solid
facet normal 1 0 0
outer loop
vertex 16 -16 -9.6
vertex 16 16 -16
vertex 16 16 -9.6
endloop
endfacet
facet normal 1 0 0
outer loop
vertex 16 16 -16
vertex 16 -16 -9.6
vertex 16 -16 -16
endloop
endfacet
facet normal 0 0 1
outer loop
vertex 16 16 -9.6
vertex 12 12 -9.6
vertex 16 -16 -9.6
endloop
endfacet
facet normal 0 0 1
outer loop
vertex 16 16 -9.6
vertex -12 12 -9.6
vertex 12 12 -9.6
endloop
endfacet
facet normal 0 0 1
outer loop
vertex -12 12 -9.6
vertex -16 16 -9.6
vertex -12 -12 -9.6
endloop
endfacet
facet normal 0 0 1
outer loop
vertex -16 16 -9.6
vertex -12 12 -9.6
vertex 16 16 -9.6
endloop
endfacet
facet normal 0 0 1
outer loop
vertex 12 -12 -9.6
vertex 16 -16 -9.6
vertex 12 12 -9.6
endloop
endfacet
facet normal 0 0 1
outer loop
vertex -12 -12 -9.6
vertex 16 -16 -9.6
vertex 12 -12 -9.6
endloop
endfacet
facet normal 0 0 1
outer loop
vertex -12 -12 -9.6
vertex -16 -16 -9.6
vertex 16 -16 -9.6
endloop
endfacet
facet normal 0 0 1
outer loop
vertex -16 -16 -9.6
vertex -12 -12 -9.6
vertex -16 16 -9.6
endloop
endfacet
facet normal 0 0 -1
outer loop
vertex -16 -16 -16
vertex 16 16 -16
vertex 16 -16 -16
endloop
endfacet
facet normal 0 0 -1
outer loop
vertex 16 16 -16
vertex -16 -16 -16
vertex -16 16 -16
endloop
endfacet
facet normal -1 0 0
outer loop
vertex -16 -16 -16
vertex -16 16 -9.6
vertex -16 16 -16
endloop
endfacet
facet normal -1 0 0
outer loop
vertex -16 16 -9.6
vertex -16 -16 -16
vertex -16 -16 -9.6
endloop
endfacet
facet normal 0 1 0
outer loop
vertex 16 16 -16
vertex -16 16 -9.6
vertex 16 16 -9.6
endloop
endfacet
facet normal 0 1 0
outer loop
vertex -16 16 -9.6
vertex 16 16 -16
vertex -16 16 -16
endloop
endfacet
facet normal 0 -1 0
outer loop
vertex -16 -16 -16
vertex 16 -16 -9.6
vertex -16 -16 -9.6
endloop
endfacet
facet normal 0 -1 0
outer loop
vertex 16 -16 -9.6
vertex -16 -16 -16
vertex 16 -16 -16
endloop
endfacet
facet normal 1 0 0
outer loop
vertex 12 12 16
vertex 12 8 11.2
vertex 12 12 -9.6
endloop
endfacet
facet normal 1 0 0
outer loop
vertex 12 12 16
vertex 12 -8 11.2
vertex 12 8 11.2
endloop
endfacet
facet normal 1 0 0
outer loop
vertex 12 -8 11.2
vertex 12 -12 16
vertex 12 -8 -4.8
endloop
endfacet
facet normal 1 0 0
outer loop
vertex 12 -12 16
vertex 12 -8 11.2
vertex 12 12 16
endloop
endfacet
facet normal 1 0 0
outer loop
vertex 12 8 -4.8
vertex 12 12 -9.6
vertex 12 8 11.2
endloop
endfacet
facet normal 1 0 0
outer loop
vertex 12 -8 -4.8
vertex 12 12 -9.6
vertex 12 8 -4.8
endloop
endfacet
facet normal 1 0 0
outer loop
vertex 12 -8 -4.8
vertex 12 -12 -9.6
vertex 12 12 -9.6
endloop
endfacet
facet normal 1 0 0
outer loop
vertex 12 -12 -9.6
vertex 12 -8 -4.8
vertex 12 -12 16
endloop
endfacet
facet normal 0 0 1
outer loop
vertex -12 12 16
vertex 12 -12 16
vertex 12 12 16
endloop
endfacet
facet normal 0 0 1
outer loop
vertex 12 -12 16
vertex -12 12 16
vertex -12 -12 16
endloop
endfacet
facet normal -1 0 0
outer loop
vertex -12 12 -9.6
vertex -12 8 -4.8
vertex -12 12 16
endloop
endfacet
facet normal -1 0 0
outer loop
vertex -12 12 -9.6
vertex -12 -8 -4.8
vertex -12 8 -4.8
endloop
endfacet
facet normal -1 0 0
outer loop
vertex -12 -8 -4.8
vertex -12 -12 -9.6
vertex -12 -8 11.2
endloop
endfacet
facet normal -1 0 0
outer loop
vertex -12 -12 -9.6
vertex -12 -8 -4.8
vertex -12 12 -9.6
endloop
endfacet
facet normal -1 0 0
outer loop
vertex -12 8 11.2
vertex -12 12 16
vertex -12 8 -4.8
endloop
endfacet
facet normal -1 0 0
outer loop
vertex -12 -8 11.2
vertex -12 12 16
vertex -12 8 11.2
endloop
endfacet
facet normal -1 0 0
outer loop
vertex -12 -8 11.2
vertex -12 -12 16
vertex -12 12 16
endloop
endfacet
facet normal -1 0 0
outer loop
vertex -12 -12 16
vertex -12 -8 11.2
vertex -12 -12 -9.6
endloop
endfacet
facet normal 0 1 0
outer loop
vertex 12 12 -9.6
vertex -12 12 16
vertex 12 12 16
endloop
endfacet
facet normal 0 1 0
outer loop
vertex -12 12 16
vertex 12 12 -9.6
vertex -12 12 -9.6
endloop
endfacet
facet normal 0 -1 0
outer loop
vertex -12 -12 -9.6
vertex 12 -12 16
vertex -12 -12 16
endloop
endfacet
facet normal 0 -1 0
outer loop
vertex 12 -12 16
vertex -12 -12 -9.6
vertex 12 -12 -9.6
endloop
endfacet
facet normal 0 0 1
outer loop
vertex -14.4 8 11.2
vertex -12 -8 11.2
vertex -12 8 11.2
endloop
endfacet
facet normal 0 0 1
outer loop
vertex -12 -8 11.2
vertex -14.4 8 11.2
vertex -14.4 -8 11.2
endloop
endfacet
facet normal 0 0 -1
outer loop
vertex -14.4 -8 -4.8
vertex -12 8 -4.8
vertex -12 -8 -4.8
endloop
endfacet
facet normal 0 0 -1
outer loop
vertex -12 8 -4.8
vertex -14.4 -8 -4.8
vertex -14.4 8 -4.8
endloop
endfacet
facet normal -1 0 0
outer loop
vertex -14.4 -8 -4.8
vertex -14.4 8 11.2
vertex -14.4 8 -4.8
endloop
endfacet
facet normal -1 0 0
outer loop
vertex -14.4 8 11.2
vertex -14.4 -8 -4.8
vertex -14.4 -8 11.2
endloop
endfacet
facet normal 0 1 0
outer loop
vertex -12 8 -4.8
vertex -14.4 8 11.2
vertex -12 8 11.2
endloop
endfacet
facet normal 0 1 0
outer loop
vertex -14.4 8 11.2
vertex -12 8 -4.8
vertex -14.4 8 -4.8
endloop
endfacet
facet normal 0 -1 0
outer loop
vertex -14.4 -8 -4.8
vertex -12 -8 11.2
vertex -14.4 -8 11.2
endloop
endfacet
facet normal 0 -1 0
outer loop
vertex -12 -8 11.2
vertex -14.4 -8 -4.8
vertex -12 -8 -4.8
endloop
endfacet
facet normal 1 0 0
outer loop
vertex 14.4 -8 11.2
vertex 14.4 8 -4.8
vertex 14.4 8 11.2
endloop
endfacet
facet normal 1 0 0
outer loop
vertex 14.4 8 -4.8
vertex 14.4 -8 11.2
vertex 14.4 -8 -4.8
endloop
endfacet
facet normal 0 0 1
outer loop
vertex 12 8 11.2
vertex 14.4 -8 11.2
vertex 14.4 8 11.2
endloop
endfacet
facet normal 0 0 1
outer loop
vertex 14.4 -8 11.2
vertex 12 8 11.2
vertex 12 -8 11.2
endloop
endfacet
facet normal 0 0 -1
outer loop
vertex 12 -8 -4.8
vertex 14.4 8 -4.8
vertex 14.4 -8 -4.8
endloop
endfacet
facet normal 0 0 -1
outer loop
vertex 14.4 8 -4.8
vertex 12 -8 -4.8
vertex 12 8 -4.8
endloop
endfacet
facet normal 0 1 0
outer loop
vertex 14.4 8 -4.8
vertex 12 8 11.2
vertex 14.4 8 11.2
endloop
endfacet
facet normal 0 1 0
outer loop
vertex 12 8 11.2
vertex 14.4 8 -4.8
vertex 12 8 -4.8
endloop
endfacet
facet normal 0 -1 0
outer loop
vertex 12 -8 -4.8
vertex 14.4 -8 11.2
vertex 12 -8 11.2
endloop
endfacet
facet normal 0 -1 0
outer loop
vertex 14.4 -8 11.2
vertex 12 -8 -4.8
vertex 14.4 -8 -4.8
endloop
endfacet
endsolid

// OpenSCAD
size = 32;//block=32 //item=8
//cube([size*0.8,size*0.8,size*0.8],center=true);



translate([0, 0, -size * 0.4]) {//bottom
  cube([size * 1, size * 1, size * 0.2], center = true);
}
;//translate

cube([size * 0.75, size * 0.75, size * 1], center = true);//base

translate([-size * 0.4, 0, size * 0.10]) {//sideKnubLeft
  cube([size * 0.1, size * 0.5, size * 0.5], center = true);
}
;//translate

translate([size * 0.4, 0, size * 0.10]) {//sideKnubRight
  cube([size * 0.1, size * 0.5, size * 0.5], center = true);
}
;//translate
difference() {

  union() {

  }
  ;//union

}
;//difference
